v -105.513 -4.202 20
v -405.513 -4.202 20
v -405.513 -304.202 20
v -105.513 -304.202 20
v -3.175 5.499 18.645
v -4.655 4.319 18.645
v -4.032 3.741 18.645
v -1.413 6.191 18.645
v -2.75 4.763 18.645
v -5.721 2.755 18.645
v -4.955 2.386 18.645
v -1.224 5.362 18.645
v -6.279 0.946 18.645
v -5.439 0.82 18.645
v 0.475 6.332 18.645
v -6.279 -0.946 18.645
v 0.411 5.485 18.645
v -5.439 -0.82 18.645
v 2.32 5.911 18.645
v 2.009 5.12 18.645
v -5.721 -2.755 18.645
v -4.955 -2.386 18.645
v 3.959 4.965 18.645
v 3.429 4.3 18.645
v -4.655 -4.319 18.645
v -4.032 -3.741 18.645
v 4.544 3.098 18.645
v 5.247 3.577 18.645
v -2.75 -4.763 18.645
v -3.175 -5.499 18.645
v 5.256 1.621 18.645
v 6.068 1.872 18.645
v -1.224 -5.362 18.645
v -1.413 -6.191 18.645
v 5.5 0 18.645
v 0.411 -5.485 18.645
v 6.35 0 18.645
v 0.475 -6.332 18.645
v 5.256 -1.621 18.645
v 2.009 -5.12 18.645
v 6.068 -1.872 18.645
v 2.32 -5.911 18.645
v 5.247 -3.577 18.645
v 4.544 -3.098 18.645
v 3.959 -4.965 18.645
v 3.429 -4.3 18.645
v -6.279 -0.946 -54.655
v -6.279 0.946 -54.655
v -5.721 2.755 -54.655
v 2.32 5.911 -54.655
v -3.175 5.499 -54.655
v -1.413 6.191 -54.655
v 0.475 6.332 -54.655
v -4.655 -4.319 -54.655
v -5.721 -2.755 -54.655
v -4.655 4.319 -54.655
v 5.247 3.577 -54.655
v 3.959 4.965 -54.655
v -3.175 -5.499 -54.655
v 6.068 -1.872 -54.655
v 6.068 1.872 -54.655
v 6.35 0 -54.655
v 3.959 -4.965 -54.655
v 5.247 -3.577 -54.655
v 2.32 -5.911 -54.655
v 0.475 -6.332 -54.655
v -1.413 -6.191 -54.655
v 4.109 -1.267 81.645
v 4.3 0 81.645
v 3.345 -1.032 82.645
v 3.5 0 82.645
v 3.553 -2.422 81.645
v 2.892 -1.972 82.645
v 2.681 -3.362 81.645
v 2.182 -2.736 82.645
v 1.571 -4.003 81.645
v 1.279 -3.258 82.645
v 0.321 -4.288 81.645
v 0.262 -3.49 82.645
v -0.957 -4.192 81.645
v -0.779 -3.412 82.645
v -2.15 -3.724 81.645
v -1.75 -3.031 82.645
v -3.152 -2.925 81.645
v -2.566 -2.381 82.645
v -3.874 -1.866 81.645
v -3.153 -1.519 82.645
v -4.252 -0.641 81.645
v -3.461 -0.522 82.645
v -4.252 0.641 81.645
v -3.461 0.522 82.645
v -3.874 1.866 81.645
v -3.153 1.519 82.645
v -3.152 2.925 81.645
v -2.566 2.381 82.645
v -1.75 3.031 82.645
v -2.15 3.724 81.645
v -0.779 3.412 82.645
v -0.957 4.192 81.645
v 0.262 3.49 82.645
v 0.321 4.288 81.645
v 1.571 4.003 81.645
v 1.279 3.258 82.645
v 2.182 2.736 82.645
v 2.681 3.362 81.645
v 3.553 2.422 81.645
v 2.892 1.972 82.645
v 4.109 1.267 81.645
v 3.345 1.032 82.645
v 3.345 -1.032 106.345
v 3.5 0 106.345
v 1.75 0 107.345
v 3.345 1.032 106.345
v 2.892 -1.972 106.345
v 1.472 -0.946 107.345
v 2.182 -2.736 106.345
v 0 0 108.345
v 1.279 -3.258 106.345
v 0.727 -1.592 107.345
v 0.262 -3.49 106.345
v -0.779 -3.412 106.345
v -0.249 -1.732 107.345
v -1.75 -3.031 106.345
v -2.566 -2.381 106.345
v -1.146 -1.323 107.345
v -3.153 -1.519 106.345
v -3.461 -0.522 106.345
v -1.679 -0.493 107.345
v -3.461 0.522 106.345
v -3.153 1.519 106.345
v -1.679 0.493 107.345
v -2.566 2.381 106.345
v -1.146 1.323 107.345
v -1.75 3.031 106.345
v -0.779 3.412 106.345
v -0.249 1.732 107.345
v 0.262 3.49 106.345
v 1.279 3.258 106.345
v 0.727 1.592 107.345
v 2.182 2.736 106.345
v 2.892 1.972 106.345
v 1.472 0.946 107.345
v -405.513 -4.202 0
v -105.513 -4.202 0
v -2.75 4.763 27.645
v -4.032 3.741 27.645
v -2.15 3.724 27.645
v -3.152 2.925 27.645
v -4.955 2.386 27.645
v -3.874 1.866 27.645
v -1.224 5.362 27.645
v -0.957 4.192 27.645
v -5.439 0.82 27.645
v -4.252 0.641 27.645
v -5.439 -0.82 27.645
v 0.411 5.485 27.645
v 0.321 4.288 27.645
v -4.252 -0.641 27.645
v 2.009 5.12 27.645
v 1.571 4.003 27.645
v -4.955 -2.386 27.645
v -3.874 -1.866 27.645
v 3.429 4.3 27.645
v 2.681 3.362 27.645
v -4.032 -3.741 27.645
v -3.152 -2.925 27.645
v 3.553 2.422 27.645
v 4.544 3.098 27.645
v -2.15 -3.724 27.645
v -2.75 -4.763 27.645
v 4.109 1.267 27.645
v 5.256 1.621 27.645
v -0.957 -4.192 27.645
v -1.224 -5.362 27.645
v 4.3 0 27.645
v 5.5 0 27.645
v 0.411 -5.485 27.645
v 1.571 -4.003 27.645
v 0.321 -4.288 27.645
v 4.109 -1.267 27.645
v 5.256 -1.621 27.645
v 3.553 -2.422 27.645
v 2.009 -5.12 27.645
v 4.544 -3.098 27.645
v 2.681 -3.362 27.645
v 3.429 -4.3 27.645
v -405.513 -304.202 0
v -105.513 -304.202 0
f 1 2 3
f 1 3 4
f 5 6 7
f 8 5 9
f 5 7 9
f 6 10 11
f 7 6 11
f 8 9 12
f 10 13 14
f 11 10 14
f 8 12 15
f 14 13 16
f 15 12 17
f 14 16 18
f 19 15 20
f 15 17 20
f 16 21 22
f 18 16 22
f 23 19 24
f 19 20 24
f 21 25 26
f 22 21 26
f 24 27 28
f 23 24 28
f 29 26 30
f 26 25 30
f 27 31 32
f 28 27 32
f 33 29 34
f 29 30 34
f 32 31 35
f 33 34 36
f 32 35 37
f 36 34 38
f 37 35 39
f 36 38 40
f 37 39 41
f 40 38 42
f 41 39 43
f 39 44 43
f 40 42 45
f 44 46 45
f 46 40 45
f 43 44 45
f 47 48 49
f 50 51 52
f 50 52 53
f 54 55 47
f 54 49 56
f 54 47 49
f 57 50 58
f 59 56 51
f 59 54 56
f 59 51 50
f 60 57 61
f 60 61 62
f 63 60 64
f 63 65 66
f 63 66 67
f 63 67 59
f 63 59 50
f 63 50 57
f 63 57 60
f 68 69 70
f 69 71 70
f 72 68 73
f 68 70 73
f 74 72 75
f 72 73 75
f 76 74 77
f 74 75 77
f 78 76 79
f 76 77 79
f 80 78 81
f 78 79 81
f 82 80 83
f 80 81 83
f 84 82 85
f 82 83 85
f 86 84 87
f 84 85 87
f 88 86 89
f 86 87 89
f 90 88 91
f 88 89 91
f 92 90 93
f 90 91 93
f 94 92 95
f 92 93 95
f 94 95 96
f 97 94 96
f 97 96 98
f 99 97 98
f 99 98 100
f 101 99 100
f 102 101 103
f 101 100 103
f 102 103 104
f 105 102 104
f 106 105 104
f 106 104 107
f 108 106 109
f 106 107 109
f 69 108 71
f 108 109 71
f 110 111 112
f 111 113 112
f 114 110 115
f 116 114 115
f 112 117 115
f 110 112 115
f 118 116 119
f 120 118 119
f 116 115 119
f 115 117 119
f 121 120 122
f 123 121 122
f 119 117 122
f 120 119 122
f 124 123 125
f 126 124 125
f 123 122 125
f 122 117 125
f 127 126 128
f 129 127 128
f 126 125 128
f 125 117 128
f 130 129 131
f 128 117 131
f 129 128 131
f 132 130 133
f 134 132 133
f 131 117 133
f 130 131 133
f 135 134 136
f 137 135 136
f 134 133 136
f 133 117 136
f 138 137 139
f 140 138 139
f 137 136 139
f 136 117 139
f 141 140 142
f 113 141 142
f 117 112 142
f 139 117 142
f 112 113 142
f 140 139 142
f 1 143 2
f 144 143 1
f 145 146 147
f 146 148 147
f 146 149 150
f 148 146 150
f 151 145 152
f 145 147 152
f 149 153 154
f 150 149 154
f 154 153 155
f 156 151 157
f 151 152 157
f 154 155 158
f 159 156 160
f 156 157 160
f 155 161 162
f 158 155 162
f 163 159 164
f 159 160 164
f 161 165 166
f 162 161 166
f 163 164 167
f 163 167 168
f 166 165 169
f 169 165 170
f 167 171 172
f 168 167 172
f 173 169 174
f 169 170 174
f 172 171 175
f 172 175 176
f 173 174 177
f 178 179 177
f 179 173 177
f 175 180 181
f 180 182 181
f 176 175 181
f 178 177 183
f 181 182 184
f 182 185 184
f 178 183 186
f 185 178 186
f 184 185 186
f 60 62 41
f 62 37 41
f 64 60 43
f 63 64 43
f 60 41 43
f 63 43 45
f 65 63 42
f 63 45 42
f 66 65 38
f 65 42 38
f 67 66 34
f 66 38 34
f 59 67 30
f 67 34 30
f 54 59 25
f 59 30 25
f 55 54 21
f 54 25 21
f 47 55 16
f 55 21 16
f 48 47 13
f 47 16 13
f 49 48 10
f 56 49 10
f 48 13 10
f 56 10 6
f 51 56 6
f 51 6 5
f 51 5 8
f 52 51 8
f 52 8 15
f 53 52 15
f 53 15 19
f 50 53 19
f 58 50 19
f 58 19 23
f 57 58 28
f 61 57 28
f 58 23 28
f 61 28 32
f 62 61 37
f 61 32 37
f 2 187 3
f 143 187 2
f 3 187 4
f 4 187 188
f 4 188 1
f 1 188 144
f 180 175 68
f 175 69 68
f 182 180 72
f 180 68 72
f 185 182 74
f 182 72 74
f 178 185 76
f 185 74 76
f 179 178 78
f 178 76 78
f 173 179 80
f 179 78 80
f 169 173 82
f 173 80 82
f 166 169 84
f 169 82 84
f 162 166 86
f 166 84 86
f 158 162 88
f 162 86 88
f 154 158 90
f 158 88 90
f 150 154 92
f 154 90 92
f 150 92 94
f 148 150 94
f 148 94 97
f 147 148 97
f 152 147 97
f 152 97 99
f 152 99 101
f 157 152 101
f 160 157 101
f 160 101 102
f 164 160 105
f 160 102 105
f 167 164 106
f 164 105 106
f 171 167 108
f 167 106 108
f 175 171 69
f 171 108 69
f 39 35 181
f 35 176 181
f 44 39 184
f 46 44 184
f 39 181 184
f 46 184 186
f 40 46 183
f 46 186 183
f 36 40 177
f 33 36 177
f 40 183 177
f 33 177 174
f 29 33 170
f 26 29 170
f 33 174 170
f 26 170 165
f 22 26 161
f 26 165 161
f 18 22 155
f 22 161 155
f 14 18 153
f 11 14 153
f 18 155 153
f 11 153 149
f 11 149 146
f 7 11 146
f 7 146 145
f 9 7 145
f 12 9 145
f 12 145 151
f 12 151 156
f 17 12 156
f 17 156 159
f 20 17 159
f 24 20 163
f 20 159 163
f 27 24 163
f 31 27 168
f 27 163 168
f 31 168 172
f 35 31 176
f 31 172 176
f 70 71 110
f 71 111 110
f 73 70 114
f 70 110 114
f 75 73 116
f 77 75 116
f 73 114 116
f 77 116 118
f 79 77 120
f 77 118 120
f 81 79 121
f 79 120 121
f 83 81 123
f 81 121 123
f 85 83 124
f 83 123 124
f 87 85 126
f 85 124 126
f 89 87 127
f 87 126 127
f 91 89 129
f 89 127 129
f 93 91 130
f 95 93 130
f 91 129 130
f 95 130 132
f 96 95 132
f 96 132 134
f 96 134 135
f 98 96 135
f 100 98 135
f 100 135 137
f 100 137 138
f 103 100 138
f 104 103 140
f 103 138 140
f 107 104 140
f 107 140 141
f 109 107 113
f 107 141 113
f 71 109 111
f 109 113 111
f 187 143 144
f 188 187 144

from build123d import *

# Parameters (mm, degrees)
F2_W      = 300
F2_H      = 300
F3_DEPTH  = 20
F1_FACE_R = 6.35
F4_DEPTH  = 13


with BuildPart() as f1:
    # F0 (on Front) → F1 (revolve)
    with BuildSketch(Plane.XZ):
        Polygon((3.5, 106.345052), (0, 108.345052), (0, -41.654948), (6.35, -41.654948), (6.35, 18.645052), (5.5, 18.645052), (5.5, 27.645052), (4.3, 27.645052), (4.3, 81.645052), (3.5, 82.645052), align=None)
    revolve(axis=Axis((0, 0, 33.345052), (0, 0, -1)))

    # F1_face (on face) → F4 (join)
    with BuildSketch(Plane(origin=(0, 0, -41.654948), x_dir=(1, 0, 0), z_dir=(0, 0, -1))):
        Circle(F1_FACE_R)
    extrude(amount=F4_DEPTH)


with BuildPart() as f3:
    # F2 (on Top) → F3 (new body)
    with BuildSketch(Plane.XY):
        with Locations((-255.512939, -154.201523)):
            Rectangle(F2_W, F2_H)
    extrude(amount=F3_DEPTH)


solid = Compound([f1.part, f3.part])
